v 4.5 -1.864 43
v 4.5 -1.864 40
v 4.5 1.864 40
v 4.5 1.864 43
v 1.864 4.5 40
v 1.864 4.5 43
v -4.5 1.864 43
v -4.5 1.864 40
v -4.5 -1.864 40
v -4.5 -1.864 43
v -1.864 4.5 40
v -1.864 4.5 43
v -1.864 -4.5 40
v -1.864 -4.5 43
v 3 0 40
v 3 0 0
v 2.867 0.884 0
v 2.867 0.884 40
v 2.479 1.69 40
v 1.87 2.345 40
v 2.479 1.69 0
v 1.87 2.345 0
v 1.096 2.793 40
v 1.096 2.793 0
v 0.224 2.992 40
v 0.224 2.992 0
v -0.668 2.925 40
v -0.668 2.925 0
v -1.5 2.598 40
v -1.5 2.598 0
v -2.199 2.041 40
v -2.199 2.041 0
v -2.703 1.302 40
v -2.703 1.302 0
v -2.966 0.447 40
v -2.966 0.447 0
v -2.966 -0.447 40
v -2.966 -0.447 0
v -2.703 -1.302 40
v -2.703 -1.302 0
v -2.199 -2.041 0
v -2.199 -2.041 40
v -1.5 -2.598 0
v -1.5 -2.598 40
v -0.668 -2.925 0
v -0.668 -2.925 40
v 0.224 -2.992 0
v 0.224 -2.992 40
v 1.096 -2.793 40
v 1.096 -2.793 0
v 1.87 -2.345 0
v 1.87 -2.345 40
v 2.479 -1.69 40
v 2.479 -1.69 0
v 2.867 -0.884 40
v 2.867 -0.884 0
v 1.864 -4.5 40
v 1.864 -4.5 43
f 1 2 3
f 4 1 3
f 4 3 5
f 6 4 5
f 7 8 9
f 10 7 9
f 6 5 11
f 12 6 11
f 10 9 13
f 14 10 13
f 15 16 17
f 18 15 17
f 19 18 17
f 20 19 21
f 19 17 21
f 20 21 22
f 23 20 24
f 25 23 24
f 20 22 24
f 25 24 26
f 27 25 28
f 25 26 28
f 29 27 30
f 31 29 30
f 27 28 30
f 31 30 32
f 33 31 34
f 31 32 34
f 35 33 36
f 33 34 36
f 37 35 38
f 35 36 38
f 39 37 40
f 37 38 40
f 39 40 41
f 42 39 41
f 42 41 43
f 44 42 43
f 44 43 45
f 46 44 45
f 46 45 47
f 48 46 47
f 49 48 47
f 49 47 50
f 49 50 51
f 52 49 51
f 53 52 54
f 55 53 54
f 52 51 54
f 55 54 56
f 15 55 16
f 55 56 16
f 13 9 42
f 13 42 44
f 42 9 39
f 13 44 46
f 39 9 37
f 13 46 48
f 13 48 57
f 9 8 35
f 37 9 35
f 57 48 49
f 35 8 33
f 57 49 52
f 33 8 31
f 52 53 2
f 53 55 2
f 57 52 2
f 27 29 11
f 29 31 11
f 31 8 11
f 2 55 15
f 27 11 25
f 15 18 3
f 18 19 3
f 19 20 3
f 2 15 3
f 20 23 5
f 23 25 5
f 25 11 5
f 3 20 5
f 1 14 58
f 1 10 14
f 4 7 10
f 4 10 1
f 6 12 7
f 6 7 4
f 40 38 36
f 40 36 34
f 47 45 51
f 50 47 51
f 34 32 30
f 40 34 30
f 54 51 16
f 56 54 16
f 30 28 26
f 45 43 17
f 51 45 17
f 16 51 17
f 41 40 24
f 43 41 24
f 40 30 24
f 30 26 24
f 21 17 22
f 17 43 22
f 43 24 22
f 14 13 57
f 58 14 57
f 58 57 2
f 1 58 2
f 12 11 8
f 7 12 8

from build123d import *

# Parameters (mm, degrees)
SKETCH1_R           = 3
BOSS_EXTRUDE1_DEPTH = 40
BOSS_EXTRUDE2_DEPTH = 3


with BuildPart() as part:
    # Sketch1 → Boss-Extrude1 (new body)
    with BuildSketch(Plane.XY):
        Circle(SKETCH1_R)
    extrude(amount=BOSS_EXTRUDE1_DEPTH)

    # Sketch2 → Boss-Extrude2 (add)
    with BuildSketch(Plane.XY.offset(40)):
        Polygon((-1.863961031, -4.5), (1.863961031, -4.5), (4.5, -1.863961031), (4.5, 1.863961031), (1.863961031, 4.5), (-1.863961031, 4.5), (-4.5, 1.863961031), (-4.5, -1.863961031), align=None)
    extrude(amount=BOSS_EXTRUDE2_DEPTH)


solid = part.part
